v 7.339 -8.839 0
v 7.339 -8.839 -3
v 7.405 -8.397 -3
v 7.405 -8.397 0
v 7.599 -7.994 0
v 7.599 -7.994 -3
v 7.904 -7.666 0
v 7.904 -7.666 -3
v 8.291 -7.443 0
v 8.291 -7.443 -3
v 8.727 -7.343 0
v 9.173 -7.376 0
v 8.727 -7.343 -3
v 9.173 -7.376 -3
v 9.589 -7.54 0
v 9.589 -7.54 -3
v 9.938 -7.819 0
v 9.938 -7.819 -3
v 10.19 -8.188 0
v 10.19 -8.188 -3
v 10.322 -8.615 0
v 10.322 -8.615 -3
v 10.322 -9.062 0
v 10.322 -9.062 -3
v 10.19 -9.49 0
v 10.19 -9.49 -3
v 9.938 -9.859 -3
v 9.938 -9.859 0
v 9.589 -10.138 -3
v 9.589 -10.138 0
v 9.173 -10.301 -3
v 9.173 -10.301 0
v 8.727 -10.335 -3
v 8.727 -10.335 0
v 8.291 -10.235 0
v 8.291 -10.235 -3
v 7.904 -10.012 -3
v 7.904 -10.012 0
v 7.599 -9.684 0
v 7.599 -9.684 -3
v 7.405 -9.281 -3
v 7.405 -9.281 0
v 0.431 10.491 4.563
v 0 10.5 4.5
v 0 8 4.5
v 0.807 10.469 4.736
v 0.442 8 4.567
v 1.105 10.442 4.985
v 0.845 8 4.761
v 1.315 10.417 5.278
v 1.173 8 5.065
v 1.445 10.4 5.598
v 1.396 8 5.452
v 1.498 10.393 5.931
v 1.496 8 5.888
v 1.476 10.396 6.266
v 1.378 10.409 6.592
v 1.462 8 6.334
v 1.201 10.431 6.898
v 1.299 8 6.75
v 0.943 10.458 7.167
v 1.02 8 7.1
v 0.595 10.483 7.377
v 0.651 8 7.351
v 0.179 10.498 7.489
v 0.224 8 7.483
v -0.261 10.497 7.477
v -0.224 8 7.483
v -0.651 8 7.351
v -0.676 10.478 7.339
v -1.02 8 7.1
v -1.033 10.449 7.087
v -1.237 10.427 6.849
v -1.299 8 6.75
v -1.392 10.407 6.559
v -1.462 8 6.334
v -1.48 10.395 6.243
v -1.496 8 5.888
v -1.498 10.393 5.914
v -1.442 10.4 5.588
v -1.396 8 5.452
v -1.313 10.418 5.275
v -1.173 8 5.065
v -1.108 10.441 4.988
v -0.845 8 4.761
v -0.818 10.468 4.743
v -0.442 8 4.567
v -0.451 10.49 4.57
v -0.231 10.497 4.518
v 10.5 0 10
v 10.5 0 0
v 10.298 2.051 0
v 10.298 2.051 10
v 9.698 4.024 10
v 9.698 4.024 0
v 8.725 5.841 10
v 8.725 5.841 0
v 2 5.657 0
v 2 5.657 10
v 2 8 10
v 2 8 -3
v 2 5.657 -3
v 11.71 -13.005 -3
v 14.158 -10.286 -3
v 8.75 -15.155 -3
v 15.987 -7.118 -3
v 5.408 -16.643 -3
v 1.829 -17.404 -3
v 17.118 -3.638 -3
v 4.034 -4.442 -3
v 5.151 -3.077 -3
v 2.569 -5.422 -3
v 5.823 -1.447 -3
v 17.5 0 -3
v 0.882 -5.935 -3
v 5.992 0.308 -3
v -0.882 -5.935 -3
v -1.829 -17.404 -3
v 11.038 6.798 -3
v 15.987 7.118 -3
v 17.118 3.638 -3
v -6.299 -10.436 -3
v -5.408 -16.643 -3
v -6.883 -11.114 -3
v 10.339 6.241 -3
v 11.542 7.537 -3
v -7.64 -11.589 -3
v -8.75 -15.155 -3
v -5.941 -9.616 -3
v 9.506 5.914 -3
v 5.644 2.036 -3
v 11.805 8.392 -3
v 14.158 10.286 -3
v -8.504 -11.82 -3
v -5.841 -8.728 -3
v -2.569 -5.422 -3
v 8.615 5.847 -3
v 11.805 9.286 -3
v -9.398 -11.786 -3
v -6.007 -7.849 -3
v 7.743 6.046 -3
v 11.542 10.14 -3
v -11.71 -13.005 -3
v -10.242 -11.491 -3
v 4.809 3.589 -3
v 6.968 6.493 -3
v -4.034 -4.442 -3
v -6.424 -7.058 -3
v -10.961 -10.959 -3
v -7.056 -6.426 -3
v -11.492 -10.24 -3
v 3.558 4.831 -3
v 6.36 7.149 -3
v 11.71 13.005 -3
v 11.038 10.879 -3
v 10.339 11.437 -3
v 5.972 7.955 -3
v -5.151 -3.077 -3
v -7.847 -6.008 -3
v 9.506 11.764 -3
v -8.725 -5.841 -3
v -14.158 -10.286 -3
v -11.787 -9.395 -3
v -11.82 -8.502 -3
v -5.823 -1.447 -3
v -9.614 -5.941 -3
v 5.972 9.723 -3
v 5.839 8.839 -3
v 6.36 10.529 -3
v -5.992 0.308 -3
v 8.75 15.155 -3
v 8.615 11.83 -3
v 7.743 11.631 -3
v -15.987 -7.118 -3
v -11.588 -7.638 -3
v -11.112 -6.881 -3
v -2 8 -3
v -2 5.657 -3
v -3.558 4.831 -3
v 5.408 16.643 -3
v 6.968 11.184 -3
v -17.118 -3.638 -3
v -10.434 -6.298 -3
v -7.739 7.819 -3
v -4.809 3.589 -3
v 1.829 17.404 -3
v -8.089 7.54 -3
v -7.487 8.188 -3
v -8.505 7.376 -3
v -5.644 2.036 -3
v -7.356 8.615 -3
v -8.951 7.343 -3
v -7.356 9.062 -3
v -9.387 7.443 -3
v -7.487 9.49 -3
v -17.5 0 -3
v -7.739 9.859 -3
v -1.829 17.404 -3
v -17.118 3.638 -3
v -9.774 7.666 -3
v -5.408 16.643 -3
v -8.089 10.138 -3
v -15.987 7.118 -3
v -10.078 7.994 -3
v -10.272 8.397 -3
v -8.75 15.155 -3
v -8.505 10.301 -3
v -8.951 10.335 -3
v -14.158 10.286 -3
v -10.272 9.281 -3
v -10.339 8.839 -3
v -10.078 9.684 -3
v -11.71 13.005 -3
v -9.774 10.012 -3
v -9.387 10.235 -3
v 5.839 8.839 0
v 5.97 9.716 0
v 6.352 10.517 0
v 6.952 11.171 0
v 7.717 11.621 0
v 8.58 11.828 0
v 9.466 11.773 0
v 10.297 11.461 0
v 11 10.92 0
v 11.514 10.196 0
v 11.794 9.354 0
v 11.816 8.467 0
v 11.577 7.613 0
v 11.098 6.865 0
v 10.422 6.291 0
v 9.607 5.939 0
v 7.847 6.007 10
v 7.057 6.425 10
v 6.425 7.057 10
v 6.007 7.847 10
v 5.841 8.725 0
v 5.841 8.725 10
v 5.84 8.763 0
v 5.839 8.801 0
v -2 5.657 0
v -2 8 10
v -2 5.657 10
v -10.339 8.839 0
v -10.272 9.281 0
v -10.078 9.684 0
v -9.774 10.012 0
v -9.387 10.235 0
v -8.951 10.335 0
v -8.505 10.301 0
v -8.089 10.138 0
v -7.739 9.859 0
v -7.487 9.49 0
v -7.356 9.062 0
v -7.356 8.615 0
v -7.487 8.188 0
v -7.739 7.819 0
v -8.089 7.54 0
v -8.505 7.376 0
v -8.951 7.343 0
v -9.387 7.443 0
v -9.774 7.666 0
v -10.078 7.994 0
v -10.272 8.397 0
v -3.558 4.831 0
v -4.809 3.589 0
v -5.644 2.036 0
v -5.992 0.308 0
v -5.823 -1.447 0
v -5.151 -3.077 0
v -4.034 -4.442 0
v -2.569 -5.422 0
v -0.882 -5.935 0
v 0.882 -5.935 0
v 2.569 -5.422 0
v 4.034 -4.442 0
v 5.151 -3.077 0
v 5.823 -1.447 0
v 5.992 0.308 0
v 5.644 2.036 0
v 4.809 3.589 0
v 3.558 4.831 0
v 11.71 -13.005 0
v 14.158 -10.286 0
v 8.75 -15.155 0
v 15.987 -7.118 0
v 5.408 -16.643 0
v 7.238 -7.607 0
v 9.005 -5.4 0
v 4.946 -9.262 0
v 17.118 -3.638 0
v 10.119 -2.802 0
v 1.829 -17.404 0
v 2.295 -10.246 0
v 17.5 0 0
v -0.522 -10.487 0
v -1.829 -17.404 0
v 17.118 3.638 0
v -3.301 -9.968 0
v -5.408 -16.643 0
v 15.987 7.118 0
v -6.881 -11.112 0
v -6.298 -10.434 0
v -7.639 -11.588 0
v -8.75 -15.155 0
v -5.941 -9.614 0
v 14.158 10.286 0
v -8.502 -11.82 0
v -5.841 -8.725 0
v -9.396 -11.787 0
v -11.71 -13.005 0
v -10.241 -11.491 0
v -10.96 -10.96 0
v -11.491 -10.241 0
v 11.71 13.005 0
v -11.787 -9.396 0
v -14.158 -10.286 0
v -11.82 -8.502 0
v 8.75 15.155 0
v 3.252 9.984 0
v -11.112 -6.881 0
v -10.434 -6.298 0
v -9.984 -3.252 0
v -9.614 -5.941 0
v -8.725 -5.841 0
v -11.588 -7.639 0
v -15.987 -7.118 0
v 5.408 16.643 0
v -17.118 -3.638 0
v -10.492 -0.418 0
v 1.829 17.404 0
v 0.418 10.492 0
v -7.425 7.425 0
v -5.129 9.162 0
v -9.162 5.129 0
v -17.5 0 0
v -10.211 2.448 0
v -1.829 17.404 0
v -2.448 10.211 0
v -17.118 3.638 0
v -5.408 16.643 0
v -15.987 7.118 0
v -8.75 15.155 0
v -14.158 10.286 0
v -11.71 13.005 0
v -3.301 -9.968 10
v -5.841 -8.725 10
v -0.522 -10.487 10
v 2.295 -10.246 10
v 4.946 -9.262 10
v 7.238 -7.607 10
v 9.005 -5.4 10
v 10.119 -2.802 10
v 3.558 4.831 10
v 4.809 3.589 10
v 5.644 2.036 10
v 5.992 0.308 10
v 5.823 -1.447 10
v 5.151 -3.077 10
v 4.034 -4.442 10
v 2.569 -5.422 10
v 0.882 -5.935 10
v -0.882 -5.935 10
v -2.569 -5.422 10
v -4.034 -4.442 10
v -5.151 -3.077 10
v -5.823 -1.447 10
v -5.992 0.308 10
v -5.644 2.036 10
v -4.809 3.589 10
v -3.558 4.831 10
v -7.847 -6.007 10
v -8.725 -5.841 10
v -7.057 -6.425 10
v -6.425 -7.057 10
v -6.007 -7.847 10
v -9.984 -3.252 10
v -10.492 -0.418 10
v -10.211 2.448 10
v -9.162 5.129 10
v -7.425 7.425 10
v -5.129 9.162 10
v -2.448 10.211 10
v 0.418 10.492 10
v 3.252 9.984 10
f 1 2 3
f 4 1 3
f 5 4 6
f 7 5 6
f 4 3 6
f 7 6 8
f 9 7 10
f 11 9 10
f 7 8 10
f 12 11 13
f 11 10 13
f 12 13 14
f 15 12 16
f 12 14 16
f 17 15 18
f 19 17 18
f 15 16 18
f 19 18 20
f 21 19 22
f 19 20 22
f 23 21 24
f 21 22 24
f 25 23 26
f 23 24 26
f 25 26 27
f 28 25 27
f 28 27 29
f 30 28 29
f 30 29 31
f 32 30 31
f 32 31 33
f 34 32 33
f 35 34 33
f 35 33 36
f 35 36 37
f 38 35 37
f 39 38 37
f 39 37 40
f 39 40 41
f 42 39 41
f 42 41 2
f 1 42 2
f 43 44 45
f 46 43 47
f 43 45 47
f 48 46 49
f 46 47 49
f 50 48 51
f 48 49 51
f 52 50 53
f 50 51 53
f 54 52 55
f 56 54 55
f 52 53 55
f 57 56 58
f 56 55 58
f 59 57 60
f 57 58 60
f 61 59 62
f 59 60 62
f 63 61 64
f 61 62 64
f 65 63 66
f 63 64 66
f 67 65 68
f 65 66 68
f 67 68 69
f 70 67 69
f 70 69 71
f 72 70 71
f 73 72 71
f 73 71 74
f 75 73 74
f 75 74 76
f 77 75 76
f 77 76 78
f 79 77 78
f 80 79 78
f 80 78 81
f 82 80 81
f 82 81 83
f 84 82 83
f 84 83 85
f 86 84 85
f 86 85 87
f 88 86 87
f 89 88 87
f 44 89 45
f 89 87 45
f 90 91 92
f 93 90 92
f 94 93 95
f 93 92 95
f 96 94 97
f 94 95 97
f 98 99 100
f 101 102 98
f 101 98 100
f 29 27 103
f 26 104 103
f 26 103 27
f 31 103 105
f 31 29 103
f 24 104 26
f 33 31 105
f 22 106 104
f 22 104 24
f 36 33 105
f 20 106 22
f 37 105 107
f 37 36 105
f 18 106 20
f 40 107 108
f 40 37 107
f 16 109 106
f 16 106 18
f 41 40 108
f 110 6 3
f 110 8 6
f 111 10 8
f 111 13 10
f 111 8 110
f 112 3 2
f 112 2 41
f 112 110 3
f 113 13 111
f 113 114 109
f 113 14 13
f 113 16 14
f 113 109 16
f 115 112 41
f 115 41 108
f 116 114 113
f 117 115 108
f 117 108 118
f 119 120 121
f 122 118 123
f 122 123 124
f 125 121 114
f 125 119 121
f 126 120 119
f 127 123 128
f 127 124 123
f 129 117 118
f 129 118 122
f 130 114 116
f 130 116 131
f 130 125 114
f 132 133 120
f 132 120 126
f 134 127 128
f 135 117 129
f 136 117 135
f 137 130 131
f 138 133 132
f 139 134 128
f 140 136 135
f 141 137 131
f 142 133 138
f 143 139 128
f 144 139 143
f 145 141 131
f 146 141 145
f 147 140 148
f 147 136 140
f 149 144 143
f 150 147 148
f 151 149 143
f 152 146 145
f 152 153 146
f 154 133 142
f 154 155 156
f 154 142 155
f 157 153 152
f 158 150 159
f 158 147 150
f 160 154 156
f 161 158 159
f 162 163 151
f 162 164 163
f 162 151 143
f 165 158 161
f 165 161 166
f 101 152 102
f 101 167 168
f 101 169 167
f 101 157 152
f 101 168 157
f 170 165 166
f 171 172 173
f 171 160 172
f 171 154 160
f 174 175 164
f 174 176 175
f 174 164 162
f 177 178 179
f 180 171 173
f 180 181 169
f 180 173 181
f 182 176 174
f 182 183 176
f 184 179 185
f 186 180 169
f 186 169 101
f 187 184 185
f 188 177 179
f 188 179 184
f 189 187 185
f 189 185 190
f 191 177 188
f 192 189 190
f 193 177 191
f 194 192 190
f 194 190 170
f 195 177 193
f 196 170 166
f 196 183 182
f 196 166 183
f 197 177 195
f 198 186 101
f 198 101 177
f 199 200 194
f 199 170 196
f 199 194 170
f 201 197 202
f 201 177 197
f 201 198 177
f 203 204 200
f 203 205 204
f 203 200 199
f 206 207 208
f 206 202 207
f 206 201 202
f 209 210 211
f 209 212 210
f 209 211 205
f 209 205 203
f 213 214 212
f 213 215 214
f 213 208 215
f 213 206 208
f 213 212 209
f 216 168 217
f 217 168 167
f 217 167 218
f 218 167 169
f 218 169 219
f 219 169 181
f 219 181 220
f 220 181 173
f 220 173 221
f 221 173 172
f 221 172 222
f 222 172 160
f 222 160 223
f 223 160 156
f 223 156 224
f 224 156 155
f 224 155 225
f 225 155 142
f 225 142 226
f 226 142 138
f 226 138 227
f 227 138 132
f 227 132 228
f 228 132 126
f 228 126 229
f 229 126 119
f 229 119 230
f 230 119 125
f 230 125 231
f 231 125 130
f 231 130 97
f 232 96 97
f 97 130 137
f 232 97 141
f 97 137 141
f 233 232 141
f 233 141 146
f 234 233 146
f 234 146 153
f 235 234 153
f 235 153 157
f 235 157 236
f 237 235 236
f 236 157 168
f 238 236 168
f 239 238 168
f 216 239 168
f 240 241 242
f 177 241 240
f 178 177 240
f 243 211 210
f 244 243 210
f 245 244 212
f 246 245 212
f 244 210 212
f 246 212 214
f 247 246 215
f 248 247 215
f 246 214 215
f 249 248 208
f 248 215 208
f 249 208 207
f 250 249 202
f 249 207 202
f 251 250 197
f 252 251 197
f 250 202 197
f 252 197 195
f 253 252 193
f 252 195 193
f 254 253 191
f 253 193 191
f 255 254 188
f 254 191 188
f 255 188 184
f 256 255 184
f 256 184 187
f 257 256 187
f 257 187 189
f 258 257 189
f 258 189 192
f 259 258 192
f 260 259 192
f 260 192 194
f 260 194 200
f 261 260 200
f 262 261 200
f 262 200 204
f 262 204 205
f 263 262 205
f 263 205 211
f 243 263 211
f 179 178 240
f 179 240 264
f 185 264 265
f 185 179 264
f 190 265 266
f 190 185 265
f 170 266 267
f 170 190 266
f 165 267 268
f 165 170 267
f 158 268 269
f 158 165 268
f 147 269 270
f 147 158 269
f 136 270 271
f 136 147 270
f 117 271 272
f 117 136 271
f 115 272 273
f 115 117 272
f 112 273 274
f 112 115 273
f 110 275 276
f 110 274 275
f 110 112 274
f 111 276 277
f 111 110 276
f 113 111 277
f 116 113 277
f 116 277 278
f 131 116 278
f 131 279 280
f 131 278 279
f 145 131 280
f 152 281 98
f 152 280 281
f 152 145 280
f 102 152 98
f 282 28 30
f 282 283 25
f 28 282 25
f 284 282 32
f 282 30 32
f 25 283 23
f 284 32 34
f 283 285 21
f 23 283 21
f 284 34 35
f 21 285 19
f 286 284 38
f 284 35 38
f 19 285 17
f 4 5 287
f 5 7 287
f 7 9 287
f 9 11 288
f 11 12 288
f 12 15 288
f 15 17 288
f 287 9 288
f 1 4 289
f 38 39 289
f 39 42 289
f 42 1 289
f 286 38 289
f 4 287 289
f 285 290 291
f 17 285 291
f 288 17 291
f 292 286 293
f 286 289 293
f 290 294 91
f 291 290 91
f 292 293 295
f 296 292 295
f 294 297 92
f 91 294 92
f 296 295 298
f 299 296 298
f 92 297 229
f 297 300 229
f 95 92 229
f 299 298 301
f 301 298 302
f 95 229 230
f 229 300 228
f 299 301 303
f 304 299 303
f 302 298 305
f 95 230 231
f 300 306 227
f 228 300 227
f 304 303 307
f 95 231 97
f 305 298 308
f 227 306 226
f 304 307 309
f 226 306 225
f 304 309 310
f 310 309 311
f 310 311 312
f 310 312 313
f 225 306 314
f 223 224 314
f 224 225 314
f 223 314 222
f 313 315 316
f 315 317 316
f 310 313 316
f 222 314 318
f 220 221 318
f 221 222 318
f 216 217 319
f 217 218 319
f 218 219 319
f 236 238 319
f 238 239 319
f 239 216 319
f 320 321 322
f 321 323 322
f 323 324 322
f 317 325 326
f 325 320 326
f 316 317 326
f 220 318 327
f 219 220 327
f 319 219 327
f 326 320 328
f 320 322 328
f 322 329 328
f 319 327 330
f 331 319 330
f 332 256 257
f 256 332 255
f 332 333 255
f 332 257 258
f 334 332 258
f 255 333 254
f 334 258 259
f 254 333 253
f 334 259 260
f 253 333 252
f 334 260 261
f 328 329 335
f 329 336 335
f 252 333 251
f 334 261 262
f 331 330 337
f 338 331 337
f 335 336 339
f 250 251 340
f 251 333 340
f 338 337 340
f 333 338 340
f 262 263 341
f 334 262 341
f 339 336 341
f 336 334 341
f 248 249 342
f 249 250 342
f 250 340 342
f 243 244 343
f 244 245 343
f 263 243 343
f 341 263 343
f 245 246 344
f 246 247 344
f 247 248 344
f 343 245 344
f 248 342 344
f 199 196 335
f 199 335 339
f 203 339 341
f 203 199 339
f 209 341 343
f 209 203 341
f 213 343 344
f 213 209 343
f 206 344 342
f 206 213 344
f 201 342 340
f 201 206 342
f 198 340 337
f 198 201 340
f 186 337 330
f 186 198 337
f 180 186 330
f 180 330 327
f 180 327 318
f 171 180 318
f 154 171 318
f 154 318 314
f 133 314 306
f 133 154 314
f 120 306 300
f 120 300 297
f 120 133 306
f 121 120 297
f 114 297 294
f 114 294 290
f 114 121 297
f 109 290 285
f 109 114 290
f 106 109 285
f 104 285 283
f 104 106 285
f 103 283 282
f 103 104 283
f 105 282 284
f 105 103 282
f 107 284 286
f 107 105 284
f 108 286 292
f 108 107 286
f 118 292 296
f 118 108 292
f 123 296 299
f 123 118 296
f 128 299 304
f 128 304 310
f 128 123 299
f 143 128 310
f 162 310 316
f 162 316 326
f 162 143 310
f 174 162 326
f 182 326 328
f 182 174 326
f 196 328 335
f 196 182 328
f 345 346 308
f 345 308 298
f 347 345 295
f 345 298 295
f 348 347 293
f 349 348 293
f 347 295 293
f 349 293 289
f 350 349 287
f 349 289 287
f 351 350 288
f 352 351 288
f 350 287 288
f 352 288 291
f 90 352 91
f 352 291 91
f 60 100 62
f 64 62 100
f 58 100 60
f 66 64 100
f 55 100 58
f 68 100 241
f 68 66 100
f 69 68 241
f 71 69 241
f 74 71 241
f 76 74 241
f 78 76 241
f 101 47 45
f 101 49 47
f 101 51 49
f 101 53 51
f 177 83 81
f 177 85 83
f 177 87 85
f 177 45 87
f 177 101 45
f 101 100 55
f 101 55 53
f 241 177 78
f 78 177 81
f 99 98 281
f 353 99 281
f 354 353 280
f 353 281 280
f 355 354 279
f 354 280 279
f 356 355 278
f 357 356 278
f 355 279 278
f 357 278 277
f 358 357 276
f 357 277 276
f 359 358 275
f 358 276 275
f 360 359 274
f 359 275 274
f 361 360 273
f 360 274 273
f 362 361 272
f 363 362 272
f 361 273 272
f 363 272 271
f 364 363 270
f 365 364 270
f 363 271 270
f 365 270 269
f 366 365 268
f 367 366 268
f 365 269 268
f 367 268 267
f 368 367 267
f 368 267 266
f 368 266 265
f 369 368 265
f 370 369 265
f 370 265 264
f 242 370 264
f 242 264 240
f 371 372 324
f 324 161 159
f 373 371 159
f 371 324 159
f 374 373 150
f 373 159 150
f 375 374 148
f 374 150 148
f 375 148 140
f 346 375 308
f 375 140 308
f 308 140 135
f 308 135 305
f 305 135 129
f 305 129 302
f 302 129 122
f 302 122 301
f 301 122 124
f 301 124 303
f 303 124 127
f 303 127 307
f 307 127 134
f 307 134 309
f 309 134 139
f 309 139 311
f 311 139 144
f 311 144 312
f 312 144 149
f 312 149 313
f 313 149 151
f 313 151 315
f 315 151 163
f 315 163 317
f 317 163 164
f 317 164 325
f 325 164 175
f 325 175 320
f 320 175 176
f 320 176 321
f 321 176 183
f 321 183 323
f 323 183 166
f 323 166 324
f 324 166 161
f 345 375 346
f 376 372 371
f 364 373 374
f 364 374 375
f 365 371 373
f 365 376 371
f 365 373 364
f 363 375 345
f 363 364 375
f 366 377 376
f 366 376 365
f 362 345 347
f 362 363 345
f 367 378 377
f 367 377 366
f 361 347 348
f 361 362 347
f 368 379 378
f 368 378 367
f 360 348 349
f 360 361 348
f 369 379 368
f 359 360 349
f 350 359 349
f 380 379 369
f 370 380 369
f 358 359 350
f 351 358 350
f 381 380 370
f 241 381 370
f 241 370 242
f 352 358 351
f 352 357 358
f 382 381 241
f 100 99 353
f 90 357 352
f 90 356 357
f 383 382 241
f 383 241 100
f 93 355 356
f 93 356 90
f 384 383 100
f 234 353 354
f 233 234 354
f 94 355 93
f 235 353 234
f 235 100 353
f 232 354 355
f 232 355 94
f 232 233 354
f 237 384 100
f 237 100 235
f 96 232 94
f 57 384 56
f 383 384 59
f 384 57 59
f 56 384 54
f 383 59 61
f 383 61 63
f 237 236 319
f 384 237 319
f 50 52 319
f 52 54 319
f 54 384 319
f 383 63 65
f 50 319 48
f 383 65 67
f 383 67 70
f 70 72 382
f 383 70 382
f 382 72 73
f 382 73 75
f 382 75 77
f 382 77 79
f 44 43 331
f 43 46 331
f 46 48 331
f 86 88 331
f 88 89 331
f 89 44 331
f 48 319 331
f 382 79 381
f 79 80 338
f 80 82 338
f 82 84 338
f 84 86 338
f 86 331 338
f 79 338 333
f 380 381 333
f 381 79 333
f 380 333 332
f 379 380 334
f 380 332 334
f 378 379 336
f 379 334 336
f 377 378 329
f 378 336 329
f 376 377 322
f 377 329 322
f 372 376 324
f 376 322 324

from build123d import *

# Parameters (mm, degrees)
SKETCH_1_R               = 10.5
EXTRUDE_1_DEPTH          = 10
EXTRUDE_START            = 3
SKETCH_3_R               = 17.5
EXTRUDE_1_2_DEPTH        = 3
SKETCH_4_R               = 1.5
SKETCH_4_R_2             = 3
CUT_EXTRUDE_1_DEPTH      = 28.955321497
CUT_EXTRUDE_2_REACH      = 34.504
CUT_EXTRUDE_2_END_RADIUS = 10.5
SKETCH_5_R               = 1.5


with BuildPart() as part:
    # 草图1 → Extrude 1 (new body)
    with BuildSketch(Plane.XY):
        Circle(SKETCH_1_R)
        with BuildLine():
            Line((-2, 8), (2, 8))
            Line((2, 8), (2, 5.656854249))
            ThreePointArc((2, 5.656854249), (0, -6), (-2, 5.656854249))
            Line((-2, 5.656854249), (-2, 8))
        make_face(mode=Mode.SUBTRACT)
    extrude(amount=EXTRUDE_1_DEPTH)

    # 草图3 → Extrude 1 2 (add)
    with BuildSketch(Plane(origin=(0, 0, 0), x_dir=(-1, 0, 0), z_dir=(0, 0, -1)).offset(EXTRUDE_START)):
        Circle(SKETCH_3_R)
        with BuildLine():
            Line((2, 8), (2, 5.656854249))
            ThreePointArc((2, 5.656854249), (0, -6), (-2, 5.656854249))
            Line((-2, 5.656854249), (-2, 8))
            Line((-2, 8), (2, 8))
        make_face(mode=Mode.SUBTRACT)
    extrude(amount=-EXTRUDE_1_2_DEPTH)

    # 草图4 → 切除-拉伸1 (cut, through all)
    with BuildSketch(Plane(origin=(0, 0, -3), x_dir=(-1, 0, 0), z_dir=(0, 0, -1))):
        with Locations((8.838834765, 8.838834765)):
            Circle(SKETCH_4_R)
        with Locations((-8.838834765, 8.838834765)):
            Circle(SKETCH_4_R_2)
        with Locations(Location((8.838834765, -8.838834765, 0), (0, 0, 92.166571934))):
            Circle(SKETCH_4_R_2)
        with Locations((-8.838834765, -8.838834765)):
            Circle(SKETCH_4_R)
    extrude(amount=-CUT_EXTRUDE_1_DEPTH, mode=Mode.SUBTRACT)

    # 切除-拉伸2: up to this cylinder (the profile starts inside it)
    cut_extrude_2_end = Plane(origin=(0, 0, 6), z_dir=(0, 0, -1)) * Cylinder(CUT_EXTRUDE_2_END_RADIUS, 91.008, mode=Mode.PRIVATE)
    # 草图5 → 切除-拉伸2 (cut, up to the surface)
    with BuildSketch(Plane.XZ.offset(-8), mode=Mode.PRIVATE) as cut_extrude_2_sk1:
        with Locations(Location((0, 6, 0), (0, 0, 270))):
            Circle(SKETCH_5_R)
    cut_extrude_2_tool1 = extrude(cut_extrude_2_sk1.sketch, amount=-CUT_EXTRUDE_2_REACH, mode=Mode.PRIVATE) & cut_extrude_2_end
    add(cut_extrude_2_tool1.solids().sort_by_distance((0, 8, 6))[0], mode=Mode.SUBTRACT)


solid = part.part
